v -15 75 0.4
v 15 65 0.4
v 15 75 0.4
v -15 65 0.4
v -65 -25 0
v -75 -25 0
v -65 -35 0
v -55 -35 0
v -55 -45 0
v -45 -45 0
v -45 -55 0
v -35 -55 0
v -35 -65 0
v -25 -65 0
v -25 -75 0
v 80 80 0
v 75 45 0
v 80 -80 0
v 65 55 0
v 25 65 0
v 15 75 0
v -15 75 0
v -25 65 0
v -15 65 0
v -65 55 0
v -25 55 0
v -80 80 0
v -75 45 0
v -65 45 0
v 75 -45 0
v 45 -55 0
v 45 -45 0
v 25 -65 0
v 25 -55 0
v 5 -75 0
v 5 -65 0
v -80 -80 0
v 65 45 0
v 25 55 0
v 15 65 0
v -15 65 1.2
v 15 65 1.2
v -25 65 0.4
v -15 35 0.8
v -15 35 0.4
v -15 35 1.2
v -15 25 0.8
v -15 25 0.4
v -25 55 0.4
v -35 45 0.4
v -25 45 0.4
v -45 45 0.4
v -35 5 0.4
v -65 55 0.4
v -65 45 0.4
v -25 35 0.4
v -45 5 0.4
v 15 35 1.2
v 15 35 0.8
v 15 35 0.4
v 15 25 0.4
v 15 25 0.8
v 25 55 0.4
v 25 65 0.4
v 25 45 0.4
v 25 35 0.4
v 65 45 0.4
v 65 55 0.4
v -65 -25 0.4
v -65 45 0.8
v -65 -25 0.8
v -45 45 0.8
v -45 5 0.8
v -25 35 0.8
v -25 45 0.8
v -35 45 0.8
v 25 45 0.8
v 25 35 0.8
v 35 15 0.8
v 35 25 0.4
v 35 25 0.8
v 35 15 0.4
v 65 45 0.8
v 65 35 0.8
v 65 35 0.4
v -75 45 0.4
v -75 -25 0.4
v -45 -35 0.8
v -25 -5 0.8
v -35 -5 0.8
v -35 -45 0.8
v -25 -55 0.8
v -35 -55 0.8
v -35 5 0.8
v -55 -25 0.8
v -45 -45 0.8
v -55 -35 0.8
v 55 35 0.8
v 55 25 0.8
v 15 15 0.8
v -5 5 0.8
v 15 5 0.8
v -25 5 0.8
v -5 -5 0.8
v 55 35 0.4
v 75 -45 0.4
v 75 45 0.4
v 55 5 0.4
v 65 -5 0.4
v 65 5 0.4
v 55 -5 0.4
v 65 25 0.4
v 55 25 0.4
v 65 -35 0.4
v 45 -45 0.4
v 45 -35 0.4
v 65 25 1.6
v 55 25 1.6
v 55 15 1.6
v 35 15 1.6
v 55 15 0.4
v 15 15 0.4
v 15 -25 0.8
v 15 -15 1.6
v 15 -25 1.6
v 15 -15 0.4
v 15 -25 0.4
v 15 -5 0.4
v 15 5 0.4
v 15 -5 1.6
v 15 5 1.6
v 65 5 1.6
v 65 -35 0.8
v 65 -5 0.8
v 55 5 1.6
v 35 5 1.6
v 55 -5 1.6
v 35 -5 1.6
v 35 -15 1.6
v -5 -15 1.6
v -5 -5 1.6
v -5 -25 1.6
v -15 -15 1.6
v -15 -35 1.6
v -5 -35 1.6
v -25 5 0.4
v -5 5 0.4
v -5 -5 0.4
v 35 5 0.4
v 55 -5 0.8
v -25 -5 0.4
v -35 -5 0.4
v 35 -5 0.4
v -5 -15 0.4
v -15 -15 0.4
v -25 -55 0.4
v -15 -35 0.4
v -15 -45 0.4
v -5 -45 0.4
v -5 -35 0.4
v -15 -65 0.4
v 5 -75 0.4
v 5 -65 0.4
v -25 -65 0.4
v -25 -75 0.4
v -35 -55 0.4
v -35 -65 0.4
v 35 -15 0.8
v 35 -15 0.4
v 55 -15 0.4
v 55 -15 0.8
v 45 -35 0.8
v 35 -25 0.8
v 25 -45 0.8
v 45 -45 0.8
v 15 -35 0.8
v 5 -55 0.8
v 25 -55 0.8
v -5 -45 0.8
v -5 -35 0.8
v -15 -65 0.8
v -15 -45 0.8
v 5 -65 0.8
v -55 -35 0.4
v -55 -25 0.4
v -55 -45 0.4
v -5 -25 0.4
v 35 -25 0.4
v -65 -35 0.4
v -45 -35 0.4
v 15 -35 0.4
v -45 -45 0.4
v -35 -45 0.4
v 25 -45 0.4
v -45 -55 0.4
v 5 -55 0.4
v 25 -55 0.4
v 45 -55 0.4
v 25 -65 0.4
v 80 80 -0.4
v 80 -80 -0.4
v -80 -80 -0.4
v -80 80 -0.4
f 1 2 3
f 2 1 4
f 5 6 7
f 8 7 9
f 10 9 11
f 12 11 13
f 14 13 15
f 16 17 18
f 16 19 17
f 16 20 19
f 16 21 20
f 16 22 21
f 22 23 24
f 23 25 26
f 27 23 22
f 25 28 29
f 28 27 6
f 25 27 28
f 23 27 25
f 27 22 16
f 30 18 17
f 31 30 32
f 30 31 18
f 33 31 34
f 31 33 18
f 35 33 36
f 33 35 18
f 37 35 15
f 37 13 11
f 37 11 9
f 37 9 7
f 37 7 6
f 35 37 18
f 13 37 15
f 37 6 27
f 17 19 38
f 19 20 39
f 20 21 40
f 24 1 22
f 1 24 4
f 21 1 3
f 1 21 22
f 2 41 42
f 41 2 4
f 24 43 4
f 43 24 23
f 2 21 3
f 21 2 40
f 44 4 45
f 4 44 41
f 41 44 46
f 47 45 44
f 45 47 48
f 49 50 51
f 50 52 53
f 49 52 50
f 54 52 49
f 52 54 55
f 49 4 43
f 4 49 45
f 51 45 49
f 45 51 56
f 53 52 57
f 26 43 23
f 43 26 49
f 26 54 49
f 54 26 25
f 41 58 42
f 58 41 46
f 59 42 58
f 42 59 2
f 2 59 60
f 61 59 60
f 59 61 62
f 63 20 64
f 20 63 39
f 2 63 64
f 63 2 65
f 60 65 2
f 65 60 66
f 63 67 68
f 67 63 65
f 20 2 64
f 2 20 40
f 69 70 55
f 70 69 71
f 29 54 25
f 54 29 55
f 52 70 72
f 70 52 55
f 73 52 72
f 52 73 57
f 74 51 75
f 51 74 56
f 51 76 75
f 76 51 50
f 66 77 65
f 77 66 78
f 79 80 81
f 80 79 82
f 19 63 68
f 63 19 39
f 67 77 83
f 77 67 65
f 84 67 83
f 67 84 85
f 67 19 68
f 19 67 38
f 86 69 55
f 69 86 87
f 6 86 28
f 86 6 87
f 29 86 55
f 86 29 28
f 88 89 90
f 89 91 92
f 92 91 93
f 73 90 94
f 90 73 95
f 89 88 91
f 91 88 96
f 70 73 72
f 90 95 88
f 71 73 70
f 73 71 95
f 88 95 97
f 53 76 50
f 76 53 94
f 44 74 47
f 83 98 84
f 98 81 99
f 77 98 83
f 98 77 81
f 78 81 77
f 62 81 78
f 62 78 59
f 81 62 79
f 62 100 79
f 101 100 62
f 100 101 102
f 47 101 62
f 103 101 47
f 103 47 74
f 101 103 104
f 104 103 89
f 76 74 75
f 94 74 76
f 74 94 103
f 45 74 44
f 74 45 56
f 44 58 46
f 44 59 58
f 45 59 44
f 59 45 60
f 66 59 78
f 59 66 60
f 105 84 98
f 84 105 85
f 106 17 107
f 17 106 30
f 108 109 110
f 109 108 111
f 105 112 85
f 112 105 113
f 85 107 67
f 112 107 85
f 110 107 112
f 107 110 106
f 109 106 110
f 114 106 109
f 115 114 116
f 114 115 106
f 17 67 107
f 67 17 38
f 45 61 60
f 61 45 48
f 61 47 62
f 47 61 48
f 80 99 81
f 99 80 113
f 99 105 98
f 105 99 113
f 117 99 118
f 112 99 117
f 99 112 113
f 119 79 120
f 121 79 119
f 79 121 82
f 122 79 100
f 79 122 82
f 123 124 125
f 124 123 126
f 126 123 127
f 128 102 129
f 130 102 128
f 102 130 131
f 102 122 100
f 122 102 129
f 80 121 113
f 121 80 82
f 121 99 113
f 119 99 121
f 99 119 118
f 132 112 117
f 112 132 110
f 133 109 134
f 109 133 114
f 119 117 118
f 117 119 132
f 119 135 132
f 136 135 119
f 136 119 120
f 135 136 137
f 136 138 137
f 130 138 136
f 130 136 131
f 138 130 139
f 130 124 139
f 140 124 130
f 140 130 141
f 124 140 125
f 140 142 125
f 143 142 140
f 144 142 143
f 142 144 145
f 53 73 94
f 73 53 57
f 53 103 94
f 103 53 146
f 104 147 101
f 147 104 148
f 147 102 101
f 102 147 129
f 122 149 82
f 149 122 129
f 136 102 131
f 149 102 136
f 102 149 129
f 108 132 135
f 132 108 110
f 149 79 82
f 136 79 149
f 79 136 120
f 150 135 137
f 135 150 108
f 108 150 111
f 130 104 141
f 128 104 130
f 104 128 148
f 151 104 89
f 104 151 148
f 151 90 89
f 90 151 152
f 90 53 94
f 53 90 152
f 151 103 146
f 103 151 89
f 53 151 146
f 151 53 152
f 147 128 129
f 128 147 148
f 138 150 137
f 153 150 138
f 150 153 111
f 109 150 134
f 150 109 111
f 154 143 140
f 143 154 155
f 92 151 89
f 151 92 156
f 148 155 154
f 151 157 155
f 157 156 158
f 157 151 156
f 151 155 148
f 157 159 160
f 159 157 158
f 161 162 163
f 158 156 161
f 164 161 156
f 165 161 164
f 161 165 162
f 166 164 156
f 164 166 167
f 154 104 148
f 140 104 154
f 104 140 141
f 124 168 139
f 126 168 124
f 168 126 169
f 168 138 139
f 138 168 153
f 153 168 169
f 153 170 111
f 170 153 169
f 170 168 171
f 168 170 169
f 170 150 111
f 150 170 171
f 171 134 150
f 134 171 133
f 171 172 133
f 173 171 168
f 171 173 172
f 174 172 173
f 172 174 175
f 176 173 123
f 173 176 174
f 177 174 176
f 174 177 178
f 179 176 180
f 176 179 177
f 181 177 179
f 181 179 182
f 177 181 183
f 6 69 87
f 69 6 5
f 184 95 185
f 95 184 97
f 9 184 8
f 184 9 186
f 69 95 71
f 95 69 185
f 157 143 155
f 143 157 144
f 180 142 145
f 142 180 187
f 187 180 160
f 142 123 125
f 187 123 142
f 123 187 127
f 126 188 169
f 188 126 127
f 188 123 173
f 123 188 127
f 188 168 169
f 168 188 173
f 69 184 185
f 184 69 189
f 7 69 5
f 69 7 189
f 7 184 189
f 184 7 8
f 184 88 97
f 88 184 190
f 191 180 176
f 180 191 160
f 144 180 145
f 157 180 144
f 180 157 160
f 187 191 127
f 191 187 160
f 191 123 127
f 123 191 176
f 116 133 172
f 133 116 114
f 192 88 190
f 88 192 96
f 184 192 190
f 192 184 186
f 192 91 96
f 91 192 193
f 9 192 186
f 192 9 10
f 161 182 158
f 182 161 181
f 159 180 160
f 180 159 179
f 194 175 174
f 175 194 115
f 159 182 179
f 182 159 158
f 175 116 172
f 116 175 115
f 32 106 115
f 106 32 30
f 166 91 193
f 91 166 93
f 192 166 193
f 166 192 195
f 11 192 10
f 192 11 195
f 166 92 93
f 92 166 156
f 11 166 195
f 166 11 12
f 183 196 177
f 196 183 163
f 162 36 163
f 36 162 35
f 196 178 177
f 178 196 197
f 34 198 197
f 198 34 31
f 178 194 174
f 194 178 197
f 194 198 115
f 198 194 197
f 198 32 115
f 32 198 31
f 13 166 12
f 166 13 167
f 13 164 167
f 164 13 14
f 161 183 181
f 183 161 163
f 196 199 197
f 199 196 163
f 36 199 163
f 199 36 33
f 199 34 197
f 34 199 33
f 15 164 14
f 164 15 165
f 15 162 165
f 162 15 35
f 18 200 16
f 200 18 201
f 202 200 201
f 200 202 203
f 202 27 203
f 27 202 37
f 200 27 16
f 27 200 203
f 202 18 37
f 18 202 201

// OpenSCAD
step = 0.4;   // height of steps, should be at least two layers in 3d print
size = 10;  // width of squares
base = 1;   // 0/1 for off/on

colors = ["black", "white", [0.647, 0.282, 0.965], "grey"];

file =              // this is the image you create
[[0, 0, 0, 0, 0, 0, 1, 1, 1, 0, 0, 0, 0, 0, 0],   // '0' for 'empty/none'
[0, 0, 0, 0, 0, 1, 3, 3, 3, 1, 0, 0, 0, 0, 0],
[0, 1, 1, 1, 1, 1, 3, 3, 3, 1, 1, 1, 1, 1, 0],
[1, 2, 2, 1, 2, 1, 3, 3, 3, 1, 2, 2, 2, 2, 1],
[1, 2, 2, 1, 2, 2, 1, 1, 1, 2, 2, 2, 2, 1, 1],
[1, 2, 2, 1, 2, 2, 2, 2, 2, 2, 2, 1, 1, 4, 1],
[1, 2, 2, 1, 2, 2, 2, 2, 2, 1, 1, 4, 4, 4, 1],
[1, 2, 2, 2, 1, 2, 2, 1, 1, 4, 4, 4, 4, 1, 1],
[1, 2, 2, 2, 2, 1, 1, 4, 4, 4, 4, 1, 1, 2, 1],
[1, 2, 2, 2, 2, 1, 4, 4, 4, 1, 1, 2, 2, 2, 1],
[0, 1, 2, 2, 2, 1, 4, 1, 1, 2, 2, 2, 2, 2, 1],
[0, 0, 1, 2, 2, 1, 1, 2, 2, 2, 2, 2, 1, 1, 1],
[0, 0, 0, 1, 2, 1, 2, 2, 2, 2, 1, 1, 0, 0, 0],
[0, 0, 0, 0, 1, 1, 2, 2, 1, 1, 0, 0, 0, 0, 0],
[0, 0, 0, 0, 0, 1, 1, 1, 0, 0, 0, 0, 0, 0, 0]];

translate([-len(file[0])*size/2, len(file)*size/2])
for (i = [0 :len(file)-1], j = [0 : len(file[0])-1])
    translate([j, -i-1, 0]*size) 
        color(colors[ (file[i][j] -1) %len(colors) ]) 
            cube([size, size, step * file[i][j]], false);

if (base == 1) 
    translate([0, 0, -step/2]) 
cube([(len(file[0])+1)*size, (len(file)+1)*size, step], true);
